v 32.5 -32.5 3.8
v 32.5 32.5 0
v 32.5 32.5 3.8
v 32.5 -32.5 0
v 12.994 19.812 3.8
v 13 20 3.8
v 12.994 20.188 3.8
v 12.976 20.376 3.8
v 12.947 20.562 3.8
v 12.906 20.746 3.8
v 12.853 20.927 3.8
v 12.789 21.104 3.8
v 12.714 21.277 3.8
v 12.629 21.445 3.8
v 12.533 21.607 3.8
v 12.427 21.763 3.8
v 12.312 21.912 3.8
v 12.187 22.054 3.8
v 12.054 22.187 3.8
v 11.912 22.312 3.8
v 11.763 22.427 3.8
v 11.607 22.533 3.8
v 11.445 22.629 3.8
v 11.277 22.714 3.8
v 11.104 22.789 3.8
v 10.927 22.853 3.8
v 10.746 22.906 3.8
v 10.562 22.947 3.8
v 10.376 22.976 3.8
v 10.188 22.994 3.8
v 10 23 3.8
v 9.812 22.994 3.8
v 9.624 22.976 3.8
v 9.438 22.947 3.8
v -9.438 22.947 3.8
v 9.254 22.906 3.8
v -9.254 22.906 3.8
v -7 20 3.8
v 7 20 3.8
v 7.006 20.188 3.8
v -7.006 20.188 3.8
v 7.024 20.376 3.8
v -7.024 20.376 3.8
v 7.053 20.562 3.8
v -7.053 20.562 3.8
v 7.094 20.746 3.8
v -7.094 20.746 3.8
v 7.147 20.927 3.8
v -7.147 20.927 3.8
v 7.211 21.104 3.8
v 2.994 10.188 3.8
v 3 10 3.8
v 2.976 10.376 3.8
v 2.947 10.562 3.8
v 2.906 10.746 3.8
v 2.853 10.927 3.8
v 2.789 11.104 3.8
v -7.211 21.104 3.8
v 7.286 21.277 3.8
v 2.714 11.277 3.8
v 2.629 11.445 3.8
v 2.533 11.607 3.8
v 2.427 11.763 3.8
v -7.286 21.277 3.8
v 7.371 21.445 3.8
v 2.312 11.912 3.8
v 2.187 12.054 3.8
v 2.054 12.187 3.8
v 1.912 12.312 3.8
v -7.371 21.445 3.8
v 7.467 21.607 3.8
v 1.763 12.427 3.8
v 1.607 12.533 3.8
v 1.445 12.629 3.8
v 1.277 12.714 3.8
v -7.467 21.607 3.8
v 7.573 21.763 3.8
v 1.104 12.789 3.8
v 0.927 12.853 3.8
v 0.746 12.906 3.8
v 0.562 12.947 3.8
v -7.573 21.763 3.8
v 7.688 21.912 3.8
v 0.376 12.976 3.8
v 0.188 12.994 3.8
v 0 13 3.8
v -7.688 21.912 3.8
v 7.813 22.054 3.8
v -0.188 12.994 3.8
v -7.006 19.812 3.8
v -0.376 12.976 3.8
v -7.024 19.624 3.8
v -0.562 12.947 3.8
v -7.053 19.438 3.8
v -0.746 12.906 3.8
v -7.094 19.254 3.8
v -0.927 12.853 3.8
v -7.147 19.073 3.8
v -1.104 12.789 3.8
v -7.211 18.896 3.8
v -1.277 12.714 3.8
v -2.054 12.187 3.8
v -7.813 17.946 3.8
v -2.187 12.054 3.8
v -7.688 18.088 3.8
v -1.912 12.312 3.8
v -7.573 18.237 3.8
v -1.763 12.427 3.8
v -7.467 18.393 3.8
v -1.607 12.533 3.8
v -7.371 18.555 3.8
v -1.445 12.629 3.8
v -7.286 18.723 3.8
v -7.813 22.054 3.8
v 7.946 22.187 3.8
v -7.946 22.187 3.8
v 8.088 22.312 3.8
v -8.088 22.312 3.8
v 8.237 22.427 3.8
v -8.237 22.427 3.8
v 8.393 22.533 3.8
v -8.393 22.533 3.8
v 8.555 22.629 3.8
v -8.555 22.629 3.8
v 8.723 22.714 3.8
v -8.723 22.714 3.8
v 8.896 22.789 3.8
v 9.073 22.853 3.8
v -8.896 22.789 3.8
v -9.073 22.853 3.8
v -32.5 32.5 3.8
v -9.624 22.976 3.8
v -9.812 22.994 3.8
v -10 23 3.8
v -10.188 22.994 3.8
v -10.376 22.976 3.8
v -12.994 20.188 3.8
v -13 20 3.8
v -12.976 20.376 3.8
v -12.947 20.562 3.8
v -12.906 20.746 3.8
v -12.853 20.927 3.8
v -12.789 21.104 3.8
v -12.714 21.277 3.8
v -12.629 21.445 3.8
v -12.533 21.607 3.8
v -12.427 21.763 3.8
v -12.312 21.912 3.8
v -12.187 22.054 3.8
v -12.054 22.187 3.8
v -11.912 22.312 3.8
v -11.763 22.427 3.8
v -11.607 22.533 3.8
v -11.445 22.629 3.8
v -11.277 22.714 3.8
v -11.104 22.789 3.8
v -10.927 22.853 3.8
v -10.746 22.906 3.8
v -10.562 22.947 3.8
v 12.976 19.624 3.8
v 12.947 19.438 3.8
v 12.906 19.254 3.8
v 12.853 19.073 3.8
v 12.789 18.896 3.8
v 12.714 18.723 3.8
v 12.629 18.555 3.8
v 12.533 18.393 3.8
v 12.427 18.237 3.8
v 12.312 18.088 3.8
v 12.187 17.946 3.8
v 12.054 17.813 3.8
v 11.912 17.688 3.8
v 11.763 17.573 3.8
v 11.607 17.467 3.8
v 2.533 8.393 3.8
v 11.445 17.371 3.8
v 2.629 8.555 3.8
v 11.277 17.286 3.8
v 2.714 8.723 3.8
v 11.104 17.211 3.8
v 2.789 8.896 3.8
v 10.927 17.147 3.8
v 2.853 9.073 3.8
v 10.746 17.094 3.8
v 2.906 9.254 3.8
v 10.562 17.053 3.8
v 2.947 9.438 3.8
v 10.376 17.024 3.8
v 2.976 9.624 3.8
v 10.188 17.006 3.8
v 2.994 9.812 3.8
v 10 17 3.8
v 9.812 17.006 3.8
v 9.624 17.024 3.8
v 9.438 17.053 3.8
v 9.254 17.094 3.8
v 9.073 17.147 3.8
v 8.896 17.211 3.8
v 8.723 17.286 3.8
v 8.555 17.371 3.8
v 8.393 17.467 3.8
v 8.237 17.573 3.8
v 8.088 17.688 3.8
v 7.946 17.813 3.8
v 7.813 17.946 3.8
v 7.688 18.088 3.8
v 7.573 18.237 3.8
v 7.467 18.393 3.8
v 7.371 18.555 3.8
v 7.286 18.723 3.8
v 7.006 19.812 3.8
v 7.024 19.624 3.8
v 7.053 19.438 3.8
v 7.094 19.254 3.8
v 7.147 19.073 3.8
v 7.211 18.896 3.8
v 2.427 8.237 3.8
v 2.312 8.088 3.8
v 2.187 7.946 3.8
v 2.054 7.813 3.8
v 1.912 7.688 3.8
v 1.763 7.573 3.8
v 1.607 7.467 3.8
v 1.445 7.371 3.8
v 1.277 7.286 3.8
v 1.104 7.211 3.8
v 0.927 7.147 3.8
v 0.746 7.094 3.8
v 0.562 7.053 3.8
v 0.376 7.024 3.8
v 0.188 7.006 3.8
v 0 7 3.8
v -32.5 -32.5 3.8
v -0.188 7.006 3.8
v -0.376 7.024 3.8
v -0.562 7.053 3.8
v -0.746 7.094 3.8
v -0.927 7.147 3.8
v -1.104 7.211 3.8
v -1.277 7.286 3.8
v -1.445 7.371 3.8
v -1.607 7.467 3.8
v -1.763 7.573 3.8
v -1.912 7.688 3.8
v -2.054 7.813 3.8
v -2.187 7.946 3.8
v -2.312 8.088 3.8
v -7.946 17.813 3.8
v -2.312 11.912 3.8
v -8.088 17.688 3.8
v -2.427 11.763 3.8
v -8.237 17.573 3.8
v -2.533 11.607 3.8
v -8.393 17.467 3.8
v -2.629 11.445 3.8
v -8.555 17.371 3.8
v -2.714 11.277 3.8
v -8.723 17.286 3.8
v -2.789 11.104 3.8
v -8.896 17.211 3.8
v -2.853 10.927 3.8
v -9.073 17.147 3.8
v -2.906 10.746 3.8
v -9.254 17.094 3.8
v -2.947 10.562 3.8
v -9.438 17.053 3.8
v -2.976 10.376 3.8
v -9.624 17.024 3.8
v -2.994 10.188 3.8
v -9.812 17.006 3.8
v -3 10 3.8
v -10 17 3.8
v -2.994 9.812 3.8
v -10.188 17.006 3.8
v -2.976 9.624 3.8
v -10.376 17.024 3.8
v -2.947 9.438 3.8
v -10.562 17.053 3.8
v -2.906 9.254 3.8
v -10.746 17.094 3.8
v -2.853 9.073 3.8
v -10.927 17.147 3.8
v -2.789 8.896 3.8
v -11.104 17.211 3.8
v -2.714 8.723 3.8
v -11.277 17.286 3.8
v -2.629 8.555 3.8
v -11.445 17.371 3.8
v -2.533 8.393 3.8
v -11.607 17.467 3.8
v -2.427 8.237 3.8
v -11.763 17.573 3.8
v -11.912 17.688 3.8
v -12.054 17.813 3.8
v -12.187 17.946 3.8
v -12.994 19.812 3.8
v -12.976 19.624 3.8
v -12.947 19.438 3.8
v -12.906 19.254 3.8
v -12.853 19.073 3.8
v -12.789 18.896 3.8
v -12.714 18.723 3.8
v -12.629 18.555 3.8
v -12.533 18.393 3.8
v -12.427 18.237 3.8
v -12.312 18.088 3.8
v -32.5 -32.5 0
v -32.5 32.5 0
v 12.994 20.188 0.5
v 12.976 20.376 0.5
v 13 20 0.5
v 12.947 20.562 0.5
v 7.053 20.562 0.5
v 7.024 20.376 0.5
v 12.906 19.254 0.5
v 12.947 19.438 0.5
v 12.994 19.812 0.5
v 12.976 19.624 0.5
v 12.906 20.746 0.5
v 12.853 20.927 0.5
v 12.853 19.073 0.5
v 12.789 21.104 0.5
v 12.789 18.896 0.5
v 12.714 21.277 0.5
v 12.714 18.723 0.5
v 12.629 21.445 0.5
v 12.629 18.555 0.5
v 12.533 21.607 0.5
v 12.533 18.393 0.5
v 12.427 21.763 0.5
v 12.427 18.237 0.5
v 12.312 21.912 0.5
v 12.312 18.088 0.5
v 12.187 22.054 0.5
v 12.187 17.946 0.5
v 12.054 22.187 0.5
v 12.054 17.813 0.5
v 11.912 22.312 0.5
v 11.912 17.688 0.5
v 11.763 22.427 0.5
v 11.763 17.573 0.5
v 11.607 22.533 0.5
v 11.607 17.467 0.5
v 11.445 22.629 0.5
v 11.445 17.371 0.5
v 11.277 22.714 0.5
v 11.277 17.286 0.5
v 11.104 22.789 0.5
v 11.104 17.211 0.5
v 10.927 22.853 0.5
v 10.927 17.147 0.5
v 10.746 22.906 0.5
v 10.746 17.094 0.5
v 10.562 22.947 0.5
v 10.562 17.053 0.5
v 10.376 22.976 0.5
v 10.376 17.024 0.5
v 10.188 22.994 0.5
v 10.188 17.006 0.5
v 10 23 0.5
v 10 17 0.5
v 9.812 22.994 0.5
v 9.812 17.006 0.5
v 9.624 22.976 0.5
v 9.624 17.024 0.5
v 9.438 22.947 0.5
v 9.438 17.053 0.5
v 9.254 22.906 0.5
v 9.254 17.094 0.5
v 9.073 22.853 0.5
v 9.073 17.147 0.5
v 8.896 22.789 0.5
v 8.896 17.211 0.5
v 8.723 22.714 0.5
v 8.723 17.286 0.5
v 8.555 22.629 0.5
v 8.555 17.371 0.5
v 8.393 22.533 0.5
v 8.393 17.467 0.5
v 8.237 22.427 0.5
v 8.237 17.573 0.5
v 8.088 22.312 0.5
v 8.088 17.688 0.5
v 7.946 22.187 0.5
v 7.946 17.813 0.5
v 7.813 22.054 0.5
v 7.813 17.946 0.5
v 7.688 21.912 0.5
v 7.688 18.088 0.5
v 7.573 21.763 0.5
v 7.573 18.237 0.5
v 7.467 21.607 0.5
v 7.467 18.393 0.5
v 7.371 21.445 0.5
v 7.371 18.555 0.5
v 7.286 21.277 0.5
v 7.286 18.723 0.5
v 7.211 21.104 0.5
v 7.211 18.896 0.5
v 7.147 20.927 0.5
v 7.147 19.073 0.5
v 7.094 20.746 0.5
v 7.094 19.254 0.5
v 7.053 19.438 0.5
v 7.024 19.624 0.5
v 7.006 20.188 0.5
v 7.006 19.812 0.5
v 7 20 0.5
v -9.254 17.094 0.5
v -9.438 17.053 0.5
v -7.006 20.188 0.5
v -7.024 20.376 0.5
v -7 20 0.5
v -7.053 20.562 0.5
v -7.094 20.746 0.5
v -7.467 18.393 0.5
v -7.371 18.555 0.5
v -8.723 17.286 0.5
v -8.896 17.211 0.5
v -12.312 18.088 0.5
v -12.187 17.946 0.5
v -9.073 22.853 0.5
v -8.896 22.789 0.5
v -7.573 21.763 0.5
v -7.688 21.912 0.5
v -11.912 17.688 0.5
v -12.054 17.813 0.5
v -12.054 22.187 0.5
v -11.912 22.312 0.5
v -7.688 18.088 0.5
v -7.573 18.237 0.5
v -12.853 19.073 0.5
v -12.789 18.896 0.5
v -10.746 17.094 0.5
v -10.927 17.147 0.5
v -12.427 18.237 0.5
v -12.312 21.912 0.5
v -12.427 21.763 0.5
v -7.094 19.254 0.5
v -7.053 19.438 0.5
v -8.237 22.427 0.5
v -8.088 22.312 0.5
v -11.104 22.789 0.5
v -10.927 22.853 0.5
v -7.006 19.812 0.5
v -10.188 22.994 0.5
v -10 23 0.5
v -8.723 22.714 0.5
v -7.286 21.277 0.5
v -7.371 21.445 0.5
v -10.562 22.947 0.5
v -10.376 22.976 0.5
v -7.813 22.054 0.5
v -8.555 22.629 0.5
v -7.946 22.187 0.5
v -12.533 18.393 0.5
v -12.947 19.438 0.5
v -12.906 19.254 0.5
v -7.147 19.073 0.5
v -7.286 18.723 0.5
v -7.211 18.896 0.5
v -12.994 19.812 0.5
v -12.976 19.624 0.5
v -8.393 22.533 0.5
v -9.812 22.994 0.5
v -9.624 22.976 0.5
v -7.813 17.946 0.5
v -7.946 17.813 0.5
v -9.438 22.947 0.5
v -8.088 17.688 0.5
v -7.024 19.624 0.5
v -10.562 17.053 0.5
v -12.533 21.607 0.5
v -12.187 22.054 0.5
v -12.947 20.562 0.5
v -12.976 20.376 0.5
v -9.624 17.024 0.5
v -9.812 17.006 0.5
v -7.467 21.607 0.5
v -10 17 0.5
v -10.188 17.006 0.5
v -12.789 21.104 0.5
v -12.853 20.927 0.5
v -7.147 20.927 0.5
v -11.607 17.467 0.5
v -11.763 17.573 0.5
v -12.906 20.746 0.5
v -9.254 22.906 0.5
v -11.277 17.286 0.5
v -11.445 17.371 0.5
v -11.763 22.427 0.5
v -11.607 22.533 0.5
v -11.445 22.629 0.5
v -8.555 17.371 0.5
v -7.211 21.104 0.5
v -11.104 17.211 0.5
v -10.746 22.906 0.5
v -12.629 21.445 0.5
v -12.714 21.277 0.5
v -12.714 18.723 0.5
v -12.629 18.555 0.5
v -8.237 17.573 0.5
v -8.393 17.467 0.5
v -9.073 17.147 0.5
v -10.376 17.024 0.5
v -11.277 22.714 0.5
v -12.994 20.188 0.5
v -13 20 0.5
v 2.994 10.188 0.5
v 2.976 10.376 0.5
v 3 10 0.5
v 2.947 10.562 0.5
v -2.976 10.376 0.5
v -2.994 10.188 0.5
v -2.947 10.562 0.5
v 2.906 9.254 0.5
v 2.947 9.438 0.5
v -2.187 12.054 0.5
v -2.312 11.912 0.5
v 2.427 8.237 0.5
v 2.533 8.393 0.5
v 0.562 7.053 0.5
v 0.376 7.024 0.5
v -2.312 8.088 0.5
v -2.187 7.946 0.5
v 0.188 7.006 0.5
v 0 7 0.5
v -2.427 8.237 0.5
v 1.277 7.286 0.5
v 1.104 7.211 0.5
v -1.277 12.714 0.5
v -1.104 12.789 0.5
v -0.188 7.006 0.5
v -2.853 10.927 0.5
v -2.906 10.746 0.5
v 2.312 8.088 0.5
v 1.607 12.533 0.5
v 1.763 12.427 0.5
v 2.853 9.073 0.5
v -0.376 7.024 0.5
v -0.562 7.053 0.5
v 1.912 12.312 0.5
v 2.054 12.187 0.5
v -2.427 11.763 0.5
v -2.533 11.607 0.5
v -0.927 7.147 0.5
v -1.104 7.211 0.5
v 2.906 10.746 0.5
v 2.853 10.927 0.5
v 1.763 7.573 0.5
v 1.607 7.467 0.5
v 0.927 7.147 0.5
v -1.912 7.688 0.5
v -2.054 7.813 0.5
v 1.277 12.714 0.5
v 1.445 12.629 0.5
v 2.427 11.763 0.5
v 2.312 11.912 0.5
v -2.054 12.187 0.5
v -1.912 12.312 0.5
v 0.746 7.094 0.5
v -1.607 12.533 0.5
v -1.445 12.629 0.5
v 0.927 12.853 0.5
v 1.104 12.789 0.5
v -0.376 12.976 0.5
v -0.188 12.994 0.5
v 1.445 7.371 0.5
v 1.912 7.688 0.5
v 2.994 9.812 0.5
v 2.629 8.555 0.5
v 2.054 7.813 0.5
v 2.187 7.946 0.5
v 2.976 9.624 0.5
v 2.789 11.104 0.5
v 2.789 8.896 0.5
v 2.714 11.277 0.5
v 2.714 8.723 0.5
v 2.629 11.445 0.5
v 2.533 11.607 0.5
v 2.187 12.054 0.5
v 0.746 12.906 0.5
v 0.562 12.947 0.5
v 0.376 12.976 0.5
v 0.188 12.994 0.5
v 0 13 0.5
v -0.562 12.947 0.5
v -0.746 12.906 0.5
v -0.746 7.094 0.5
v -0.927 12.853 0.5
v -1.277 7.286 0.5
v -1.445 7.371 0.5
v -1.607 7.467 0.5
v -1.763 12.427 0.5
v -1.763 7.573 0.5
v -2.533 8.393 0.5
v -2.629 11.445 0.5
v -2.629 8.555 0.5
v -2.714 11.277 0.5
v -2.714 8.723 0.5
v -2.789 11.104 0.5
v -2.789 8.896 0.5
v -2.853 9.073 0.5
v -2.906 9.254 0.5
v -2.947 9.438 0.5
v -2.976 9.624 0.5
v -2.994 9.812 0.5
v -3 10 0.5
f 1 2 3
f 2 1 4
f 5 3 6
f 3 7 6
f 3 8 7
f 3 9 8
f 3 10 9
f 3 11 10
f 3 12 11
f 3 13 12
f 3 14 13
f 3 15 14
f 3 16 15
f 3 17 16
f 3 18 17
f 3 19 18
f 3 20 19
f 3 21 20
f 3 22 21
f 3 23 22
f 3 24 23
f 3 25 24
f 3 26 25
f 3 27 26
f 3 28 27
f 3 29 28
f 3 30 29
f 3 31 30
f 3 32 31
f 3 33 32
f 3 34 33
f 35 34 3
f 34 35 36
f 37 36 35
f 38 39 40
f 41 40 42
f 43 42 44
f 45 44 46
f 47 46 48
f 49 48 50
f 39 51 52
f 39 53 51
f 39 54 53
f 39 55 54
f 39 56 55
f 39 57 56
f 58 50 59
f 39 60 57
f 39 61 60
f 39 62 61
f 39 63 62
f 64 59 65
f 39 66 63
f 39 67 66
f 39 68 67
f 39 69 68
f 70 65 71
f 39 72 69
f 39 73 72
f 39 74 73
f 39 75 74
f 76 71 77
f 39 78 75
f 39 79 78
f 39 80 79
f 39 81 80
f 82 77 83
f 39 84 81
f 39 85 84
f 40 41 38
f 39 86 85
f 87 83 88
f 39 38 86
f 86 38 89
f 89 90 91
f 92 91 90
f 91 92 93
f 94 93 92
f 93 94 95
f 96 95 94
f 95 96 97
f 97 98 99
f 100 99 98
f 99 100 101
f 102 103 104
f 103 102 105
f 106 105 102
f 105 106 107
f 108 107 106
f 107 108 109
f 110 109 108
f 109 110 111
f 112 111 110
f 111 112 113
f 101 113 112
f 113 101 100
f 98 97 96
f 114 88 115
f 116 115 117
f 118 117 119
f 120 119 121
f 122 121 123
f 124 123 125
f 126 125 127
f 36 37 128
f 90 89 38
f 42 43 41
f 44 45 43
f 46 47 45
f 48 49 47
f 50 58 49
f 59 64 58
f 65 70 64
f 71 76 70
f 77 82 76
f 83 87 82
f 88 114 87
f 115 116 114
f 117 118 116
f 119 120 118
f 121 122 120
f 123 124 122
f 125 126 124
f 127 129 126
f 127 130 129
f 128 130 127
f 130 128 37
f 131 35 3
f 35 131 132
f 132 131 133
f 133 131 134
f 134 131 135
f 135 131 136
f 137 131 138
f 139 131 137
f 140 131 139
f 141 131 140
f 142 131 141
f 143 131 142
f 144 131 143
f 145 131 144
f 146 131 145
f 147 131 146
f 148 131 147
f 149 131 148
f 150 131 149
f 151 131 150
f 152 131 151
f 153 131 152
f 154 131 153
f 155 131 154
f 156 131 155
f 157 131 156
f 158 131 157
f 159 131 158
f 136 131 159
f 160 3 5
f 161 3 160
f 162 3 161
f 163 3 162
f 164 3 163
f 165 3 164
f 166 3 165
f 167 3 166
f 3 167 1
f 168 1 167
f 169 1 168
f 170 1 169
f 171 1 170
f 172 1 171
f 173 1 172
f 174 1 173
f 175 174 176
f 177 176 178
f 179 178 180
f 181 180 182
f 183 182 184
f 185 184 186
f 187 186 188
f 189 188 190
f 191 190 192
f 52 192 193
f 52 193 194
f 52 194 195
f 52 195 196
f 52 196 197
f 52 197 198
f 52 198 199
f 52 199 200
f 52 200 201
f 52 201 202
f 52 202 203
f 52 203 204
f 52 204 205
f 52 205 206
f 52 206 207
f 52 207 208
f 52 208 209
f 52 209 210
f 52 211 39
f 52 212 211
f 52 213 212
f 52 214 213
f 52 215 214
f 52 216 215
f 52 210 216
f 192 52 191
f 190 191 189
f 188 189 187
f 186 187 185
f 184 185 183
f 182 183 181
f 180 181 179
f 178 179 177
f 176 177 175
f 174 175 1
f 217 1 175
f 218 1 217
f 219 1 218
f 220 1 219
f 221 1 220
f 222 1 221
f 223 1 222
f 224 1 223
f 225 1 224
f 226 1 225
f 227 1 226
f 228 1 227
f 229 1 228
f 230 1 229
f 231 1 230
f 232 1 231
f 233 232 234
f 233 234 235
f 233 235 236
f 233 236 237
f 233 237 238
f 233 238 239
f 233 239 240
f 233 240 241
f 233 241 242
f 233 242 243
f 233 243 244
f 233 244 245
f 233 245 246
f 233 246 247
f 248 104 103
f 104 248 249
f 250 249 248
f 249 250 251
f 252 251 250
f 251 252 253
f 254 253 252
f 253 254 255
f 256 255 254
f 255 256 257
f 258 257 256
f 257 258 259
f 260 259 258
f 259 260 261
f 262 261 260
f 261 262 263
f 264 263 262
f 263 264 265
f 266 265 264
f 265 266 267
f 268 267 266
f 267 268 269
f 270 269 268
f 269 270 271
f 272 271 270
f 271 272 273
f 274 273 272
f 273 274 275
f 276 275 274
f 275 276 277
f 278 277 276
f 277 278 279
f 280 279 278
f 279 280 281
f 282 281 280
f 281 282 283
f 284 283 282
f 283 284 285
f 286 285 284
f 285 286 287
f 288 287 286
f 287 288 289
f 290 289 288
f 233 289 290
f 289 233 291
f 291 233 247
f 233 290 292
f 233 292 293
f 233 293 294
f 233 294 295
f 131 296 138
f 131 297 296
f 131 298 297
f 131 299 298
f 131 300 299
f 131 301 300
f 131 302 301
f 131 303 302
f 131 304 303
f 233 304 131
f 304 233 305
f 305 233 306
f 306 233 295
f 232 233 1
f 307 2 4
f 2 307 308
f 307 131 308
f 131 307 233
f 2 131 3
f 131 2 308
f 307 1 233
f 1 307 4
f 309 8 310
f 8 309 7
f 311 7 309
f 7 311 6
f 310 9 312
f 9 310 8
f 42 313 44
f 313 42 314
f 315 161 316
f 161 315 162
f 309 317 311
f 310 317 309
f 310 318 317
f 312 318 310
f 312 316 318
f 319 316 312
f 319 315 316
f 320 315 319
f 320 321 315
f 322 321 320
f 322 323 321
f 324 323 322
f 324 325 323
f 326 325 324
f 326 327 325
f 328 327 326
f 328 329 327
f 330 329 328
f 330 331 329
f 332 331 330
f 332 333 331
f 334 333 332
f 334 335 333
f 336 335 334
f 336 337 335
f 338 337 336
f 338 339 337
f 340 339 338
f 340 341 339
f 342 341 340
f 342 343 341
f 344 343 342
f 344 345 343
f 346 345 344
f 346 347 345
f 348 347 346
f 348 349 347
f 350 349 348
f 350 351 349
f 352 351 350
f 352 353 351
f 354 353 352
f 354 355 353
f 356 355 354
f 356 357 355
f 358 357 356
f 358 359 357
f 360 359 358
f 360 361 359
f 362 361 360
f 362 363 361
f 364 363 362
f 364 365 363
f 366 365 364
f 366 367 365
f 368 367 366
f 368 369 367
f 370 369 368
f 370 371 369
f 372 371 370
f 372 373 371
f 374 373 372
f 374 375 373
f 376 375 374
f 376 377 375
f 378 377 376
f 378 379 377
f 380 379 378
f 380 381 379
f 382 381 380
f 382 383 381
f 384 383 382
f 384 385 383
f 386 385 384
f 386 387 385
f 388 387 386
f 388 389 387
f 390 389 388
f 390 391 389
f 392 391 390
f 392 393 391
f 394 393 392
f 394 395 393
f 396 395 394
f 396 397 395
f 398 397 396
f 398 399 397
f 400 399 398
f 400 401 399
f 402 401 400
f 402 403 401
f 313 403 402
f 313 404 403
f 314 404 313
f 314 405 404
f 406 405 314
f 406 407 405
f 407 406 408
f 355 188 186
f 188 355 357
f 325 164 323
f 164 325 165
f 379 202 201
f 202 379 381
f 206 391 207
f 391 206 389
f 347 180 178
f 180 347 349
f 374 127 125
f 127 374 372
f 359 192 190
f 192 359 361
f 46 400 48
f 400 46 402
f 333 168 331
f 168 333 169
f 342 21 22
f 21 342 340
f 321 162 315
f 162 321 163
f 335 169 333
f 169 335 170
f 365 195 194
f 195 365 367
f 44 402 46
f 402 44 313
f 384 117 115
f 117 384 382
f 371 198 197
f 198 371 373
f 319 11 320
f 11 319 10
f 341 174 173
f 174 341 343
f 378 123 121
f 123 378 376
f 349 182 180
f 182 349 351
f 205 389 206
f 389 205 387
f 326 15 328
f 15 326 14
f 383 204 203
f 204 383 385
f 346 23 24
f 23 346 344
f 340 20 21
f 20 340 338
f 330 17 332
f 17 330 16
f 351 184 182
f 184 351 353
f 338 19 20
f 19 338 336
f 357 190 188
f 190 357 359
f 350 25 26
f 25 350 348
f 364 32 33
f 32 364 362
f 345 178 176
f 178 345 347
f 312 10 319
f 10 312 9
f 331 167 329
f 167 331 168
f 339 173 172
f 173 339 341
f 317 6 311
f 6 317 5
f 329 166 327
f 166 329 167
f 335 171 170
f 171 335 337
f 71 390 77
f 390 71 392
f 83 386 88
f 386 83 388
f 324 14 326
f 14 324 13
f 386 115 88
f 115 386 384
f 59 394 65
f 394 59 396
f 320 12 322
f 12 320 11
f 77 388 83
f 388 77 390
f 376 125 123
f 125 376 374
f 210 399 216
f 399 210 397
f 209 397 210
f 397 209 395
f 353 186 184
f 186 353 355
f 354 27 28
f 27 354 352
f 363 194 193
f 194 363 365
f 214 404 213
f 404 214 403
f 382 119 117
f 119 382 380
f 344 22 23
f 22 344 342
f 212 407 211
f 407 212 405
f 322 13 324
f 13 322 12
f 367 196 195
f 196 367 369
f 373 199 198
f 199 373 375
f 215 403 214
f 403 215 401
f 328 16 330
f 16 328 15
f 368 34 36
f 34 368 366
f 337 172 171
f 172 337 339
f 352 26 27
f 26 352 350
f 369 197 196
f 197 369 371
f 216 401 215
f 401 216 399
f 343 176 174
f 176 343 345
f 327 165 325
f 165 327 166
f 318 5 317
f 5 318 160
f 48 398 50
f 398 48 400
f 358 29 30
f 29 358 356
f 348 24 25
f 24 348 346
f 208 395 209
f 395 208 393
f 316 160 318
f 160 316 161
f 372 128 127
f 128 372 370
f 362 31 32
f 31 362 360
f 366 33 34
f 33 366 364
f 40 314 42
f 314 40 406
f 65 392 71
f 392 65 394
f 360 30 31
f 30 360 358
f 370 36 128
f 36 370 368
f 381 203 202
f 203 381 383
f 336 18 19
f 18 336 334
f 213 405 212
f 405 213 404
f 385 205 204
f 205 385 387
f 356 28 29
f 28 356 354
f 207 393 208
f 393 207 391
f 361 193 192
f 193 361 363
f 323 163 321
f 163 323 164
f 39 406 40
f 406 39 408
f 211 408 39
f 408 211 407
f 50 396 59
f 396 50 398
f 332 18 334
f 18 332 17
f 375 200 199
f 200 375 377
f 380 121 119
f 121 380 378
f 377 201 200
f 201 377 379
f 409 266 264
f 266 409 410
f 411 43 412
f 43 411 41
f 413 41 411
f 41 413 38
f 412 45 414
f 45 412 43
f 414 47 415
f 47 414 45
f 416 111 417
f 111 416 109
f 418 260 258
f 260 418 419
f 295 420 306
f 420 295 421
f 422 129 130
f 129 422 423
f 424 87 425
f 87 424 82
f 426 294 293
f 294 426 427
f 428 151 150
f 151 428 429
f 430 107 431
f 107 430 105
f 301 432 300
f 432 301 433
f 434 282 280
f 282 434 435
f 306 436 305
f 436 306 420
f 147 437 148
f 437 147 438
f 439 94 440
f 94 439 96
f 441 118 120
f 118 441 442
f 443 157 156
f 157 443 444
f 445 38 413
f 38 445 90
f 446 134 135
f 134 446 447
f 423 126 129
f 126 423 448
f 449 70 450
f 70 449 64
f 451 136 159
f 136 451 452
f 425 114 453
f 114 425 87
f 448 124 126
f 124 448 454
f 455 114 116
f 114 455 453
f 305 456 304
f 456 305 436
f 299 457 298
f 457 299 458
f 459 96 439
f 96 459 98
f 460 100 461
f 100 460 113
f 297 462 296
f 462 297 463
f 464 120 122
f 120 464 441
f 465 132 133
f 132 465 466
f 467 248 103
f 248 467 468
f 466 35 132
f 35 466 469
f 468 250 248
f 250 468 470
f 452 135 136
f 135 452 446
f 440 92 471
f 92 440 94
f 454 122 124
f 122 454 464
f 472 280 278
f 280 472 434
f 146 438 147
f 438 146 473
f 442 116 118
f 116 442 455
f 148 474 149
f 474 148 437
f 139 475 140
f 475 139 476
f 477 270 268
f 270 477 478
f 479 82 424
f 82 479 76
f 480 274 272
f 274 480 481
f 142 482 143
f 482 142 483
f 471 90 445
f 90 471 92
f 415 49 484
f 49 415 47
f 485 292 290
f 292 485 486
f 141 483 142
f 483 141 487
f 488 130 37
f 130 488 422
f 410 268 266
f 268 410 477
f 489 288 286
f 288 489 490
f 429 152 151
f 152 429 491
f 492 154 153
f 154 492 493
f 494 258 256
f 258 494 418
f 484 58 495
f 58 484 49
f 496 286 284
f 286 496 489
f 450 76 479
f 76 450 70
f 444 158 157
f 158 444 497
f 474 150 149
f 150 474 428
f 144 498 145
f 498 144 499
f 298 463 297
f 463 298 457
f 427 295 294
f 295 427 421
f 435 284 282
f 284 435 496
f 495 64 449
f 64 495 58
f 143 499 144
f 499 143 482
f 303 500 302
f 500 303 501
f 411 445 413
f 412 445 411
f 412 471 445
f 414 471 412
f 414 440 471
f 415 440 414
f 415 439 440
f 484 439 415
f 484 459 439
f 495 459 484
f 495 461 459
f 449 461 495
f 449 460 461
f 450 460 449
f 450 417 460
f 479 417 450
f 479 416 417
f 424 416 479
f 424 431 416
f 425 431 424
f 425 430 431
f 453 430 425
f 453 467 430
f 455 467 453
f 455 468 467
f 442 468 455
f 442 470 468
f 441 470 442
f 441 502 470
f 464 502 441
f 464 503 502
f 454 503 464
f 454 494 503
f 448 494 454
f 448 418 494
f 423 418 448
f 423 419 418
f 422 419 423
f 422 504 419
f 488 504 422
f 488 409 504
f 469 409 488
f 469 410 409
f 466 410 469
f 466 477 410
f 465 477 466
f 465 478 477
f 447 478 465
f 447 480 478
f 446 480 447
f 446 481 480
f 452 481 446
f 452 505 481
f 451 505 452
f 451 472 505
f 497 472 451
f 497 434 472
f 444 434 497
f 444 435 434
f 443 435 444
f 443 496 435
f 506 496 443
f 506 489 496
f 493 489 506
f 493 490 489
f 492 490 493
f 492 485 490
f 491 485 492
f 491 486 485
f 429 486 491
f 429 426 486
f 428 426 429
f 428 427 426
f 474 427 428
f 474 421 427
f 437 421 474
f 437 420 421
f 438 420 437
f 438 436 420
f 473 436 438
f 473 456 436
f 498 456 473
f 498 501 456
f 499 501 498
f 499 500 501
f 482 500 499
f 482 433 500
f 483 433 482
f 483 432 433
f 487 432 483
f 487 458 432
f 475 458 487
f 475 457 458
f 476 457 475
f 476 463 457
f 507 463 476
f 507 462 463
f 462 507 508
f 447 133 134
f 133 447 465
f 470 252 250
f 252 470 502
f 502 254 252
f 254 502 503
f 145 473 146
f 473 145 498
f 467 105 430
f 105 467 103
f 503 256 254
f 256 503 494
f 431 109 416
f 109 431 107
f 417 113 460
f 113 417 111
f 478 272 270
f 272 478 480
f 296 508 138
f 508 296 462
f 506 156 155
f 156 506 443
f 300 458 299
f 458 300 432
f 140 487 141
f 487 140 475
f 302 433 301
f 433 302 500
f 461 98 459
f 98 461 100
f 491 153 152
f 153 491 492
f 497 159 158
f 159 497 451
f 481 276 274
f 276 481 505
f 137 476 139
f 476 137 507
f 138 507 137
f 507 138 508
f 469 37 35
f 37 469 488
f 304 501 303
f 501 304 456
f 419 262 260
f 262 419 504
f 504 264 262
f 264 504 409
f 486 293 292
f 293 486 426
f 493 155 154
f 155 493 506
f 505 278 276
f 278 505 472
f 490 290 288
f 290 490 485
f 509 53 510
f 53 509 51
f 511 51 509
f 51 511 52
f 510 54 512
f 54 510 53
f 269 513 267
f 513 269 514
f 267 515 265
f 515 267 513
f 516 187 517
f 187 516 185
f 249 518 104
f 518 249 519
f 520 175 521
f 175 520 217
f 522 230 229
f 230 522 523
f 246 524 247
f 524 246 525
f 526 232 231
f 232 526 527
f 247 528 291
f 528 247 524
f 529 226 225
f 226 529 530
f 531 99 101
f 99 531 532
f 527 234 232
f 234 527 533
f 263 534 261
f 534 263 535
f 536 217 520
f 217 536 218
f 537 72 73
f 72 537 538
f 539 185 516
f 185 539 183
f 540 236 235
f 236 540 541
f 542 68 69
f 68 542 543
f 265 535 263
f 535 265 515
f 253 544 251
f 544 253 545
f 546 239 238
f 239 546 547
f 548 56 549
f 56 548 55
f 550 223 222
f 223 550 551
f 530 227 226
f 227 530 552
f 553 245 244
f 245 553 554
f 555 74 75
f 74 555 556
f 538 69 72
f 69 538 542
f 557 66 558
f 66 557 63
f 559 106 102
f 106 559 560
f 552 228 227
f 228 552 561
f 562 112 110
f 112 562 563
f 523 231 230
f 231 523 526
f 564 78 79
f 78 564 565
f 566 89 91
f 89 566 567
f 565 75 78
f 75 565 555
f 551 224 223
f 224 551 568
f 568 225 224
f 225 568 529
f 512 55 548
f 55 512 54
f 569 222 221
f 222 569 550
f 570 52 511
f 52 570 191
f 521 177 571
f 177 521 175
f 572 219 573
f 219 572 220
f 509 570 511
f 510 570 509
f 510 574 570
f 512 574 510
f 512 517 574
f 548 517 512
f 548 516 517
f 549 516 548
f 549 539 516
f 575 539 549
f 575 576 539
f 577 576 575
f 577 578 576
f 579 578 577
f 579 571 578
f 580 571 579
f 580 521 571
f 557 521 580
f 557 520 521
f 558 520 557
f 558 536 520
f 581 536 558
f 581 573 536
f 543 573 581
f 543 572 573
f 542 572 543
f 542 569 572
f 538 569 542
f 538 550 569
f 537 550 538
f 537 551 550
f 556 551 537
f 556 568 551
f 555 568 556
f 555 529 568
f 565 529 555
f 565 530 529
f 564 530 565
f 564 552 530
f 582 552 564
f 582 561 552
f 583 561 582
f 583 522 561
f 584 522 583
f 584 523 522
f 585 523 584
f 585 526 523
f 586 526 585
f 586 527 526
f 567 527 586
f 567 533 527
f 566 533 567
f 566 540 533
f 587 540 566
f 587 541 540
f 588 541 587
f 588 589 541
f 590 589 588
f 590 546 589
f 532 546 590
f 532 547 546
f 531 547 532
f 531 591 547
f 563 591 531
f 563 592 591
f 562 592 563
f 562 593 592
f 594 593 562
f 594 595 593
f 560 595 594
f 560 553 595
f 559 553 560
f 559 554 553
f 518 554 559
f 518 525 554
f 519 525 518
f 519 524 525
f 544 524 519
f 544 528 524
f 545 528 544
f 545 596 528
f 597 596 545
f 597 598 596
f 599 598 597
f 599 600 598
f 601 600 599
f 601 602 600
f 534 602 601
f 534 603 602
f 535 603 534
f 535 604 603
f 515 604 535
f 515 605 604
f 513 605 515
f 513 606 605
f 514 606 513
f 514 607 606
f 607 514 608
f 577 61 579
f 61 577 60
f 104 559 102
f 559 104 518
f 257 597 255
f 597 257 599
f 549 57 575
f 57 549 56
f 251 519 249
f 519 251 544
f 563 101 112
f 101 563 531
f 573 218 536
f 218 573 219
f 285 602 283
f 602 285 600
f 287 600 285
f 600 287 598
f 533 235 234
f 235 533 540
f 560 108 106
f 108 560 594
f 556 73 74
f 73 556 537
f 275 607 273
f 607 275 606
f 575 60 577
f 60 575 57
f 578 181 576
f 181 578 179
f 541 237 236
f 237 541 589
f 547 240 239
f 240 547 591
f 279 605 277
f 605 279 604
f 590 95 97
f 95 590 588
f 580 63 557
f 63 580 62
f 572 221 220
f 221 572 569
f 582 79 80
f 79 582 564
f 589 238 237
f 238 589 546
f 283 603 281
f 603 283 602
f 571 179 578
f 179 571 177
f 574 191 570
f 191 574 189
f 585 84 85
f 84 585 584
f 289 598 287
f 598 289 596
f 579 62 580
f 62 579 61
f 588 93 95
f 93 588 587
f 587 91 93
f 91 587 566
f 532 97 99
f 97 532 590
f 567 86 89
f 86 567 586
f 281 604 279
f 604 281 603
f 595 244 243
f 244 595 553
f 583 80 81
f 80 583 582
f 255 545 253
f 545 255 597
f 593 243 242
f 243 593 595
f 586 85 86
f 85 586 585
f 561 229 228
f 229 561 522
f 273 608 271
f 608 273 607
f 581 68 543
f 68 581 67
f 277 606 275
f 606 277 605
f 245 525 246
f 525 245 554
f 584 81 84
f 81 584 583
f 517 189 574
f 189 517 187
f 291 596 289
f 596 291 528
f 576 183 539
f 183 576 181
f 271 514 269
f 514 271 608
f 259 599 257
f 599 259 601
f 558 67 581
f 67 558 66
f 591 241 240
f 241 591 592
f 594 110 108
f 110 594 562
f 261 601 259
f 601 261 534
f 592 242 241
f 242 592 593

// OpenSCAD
difference(){
	union(){ 

              
            

        translate([-32.5, -32.5,0]){
           cube([65,65,3.8], center=false);
        }                


        translate([0,10,0]){
            rotate([0,0,0]){
                cylinder(h=1.8, r=8, $fn=100, center=false);
            }   
        }



	}
	union() {

        translate([+10,20,0.5]){
            rotate([0,0,0]){
                cylinder(h=5, r=3, $fn=100, center=false);
            }   
        }
        translate([-10,20,0.5]){
            rotate([0,0,0]){
                cylinder(h=5, r=3, $fn=100, center=false);
            }   
        }
        translate([0,10,0.5]){
            rotate([0,0,0]){
                cylinder(h=5, r=3, $fn=100, center=false);
            }   
        }

	}
}
